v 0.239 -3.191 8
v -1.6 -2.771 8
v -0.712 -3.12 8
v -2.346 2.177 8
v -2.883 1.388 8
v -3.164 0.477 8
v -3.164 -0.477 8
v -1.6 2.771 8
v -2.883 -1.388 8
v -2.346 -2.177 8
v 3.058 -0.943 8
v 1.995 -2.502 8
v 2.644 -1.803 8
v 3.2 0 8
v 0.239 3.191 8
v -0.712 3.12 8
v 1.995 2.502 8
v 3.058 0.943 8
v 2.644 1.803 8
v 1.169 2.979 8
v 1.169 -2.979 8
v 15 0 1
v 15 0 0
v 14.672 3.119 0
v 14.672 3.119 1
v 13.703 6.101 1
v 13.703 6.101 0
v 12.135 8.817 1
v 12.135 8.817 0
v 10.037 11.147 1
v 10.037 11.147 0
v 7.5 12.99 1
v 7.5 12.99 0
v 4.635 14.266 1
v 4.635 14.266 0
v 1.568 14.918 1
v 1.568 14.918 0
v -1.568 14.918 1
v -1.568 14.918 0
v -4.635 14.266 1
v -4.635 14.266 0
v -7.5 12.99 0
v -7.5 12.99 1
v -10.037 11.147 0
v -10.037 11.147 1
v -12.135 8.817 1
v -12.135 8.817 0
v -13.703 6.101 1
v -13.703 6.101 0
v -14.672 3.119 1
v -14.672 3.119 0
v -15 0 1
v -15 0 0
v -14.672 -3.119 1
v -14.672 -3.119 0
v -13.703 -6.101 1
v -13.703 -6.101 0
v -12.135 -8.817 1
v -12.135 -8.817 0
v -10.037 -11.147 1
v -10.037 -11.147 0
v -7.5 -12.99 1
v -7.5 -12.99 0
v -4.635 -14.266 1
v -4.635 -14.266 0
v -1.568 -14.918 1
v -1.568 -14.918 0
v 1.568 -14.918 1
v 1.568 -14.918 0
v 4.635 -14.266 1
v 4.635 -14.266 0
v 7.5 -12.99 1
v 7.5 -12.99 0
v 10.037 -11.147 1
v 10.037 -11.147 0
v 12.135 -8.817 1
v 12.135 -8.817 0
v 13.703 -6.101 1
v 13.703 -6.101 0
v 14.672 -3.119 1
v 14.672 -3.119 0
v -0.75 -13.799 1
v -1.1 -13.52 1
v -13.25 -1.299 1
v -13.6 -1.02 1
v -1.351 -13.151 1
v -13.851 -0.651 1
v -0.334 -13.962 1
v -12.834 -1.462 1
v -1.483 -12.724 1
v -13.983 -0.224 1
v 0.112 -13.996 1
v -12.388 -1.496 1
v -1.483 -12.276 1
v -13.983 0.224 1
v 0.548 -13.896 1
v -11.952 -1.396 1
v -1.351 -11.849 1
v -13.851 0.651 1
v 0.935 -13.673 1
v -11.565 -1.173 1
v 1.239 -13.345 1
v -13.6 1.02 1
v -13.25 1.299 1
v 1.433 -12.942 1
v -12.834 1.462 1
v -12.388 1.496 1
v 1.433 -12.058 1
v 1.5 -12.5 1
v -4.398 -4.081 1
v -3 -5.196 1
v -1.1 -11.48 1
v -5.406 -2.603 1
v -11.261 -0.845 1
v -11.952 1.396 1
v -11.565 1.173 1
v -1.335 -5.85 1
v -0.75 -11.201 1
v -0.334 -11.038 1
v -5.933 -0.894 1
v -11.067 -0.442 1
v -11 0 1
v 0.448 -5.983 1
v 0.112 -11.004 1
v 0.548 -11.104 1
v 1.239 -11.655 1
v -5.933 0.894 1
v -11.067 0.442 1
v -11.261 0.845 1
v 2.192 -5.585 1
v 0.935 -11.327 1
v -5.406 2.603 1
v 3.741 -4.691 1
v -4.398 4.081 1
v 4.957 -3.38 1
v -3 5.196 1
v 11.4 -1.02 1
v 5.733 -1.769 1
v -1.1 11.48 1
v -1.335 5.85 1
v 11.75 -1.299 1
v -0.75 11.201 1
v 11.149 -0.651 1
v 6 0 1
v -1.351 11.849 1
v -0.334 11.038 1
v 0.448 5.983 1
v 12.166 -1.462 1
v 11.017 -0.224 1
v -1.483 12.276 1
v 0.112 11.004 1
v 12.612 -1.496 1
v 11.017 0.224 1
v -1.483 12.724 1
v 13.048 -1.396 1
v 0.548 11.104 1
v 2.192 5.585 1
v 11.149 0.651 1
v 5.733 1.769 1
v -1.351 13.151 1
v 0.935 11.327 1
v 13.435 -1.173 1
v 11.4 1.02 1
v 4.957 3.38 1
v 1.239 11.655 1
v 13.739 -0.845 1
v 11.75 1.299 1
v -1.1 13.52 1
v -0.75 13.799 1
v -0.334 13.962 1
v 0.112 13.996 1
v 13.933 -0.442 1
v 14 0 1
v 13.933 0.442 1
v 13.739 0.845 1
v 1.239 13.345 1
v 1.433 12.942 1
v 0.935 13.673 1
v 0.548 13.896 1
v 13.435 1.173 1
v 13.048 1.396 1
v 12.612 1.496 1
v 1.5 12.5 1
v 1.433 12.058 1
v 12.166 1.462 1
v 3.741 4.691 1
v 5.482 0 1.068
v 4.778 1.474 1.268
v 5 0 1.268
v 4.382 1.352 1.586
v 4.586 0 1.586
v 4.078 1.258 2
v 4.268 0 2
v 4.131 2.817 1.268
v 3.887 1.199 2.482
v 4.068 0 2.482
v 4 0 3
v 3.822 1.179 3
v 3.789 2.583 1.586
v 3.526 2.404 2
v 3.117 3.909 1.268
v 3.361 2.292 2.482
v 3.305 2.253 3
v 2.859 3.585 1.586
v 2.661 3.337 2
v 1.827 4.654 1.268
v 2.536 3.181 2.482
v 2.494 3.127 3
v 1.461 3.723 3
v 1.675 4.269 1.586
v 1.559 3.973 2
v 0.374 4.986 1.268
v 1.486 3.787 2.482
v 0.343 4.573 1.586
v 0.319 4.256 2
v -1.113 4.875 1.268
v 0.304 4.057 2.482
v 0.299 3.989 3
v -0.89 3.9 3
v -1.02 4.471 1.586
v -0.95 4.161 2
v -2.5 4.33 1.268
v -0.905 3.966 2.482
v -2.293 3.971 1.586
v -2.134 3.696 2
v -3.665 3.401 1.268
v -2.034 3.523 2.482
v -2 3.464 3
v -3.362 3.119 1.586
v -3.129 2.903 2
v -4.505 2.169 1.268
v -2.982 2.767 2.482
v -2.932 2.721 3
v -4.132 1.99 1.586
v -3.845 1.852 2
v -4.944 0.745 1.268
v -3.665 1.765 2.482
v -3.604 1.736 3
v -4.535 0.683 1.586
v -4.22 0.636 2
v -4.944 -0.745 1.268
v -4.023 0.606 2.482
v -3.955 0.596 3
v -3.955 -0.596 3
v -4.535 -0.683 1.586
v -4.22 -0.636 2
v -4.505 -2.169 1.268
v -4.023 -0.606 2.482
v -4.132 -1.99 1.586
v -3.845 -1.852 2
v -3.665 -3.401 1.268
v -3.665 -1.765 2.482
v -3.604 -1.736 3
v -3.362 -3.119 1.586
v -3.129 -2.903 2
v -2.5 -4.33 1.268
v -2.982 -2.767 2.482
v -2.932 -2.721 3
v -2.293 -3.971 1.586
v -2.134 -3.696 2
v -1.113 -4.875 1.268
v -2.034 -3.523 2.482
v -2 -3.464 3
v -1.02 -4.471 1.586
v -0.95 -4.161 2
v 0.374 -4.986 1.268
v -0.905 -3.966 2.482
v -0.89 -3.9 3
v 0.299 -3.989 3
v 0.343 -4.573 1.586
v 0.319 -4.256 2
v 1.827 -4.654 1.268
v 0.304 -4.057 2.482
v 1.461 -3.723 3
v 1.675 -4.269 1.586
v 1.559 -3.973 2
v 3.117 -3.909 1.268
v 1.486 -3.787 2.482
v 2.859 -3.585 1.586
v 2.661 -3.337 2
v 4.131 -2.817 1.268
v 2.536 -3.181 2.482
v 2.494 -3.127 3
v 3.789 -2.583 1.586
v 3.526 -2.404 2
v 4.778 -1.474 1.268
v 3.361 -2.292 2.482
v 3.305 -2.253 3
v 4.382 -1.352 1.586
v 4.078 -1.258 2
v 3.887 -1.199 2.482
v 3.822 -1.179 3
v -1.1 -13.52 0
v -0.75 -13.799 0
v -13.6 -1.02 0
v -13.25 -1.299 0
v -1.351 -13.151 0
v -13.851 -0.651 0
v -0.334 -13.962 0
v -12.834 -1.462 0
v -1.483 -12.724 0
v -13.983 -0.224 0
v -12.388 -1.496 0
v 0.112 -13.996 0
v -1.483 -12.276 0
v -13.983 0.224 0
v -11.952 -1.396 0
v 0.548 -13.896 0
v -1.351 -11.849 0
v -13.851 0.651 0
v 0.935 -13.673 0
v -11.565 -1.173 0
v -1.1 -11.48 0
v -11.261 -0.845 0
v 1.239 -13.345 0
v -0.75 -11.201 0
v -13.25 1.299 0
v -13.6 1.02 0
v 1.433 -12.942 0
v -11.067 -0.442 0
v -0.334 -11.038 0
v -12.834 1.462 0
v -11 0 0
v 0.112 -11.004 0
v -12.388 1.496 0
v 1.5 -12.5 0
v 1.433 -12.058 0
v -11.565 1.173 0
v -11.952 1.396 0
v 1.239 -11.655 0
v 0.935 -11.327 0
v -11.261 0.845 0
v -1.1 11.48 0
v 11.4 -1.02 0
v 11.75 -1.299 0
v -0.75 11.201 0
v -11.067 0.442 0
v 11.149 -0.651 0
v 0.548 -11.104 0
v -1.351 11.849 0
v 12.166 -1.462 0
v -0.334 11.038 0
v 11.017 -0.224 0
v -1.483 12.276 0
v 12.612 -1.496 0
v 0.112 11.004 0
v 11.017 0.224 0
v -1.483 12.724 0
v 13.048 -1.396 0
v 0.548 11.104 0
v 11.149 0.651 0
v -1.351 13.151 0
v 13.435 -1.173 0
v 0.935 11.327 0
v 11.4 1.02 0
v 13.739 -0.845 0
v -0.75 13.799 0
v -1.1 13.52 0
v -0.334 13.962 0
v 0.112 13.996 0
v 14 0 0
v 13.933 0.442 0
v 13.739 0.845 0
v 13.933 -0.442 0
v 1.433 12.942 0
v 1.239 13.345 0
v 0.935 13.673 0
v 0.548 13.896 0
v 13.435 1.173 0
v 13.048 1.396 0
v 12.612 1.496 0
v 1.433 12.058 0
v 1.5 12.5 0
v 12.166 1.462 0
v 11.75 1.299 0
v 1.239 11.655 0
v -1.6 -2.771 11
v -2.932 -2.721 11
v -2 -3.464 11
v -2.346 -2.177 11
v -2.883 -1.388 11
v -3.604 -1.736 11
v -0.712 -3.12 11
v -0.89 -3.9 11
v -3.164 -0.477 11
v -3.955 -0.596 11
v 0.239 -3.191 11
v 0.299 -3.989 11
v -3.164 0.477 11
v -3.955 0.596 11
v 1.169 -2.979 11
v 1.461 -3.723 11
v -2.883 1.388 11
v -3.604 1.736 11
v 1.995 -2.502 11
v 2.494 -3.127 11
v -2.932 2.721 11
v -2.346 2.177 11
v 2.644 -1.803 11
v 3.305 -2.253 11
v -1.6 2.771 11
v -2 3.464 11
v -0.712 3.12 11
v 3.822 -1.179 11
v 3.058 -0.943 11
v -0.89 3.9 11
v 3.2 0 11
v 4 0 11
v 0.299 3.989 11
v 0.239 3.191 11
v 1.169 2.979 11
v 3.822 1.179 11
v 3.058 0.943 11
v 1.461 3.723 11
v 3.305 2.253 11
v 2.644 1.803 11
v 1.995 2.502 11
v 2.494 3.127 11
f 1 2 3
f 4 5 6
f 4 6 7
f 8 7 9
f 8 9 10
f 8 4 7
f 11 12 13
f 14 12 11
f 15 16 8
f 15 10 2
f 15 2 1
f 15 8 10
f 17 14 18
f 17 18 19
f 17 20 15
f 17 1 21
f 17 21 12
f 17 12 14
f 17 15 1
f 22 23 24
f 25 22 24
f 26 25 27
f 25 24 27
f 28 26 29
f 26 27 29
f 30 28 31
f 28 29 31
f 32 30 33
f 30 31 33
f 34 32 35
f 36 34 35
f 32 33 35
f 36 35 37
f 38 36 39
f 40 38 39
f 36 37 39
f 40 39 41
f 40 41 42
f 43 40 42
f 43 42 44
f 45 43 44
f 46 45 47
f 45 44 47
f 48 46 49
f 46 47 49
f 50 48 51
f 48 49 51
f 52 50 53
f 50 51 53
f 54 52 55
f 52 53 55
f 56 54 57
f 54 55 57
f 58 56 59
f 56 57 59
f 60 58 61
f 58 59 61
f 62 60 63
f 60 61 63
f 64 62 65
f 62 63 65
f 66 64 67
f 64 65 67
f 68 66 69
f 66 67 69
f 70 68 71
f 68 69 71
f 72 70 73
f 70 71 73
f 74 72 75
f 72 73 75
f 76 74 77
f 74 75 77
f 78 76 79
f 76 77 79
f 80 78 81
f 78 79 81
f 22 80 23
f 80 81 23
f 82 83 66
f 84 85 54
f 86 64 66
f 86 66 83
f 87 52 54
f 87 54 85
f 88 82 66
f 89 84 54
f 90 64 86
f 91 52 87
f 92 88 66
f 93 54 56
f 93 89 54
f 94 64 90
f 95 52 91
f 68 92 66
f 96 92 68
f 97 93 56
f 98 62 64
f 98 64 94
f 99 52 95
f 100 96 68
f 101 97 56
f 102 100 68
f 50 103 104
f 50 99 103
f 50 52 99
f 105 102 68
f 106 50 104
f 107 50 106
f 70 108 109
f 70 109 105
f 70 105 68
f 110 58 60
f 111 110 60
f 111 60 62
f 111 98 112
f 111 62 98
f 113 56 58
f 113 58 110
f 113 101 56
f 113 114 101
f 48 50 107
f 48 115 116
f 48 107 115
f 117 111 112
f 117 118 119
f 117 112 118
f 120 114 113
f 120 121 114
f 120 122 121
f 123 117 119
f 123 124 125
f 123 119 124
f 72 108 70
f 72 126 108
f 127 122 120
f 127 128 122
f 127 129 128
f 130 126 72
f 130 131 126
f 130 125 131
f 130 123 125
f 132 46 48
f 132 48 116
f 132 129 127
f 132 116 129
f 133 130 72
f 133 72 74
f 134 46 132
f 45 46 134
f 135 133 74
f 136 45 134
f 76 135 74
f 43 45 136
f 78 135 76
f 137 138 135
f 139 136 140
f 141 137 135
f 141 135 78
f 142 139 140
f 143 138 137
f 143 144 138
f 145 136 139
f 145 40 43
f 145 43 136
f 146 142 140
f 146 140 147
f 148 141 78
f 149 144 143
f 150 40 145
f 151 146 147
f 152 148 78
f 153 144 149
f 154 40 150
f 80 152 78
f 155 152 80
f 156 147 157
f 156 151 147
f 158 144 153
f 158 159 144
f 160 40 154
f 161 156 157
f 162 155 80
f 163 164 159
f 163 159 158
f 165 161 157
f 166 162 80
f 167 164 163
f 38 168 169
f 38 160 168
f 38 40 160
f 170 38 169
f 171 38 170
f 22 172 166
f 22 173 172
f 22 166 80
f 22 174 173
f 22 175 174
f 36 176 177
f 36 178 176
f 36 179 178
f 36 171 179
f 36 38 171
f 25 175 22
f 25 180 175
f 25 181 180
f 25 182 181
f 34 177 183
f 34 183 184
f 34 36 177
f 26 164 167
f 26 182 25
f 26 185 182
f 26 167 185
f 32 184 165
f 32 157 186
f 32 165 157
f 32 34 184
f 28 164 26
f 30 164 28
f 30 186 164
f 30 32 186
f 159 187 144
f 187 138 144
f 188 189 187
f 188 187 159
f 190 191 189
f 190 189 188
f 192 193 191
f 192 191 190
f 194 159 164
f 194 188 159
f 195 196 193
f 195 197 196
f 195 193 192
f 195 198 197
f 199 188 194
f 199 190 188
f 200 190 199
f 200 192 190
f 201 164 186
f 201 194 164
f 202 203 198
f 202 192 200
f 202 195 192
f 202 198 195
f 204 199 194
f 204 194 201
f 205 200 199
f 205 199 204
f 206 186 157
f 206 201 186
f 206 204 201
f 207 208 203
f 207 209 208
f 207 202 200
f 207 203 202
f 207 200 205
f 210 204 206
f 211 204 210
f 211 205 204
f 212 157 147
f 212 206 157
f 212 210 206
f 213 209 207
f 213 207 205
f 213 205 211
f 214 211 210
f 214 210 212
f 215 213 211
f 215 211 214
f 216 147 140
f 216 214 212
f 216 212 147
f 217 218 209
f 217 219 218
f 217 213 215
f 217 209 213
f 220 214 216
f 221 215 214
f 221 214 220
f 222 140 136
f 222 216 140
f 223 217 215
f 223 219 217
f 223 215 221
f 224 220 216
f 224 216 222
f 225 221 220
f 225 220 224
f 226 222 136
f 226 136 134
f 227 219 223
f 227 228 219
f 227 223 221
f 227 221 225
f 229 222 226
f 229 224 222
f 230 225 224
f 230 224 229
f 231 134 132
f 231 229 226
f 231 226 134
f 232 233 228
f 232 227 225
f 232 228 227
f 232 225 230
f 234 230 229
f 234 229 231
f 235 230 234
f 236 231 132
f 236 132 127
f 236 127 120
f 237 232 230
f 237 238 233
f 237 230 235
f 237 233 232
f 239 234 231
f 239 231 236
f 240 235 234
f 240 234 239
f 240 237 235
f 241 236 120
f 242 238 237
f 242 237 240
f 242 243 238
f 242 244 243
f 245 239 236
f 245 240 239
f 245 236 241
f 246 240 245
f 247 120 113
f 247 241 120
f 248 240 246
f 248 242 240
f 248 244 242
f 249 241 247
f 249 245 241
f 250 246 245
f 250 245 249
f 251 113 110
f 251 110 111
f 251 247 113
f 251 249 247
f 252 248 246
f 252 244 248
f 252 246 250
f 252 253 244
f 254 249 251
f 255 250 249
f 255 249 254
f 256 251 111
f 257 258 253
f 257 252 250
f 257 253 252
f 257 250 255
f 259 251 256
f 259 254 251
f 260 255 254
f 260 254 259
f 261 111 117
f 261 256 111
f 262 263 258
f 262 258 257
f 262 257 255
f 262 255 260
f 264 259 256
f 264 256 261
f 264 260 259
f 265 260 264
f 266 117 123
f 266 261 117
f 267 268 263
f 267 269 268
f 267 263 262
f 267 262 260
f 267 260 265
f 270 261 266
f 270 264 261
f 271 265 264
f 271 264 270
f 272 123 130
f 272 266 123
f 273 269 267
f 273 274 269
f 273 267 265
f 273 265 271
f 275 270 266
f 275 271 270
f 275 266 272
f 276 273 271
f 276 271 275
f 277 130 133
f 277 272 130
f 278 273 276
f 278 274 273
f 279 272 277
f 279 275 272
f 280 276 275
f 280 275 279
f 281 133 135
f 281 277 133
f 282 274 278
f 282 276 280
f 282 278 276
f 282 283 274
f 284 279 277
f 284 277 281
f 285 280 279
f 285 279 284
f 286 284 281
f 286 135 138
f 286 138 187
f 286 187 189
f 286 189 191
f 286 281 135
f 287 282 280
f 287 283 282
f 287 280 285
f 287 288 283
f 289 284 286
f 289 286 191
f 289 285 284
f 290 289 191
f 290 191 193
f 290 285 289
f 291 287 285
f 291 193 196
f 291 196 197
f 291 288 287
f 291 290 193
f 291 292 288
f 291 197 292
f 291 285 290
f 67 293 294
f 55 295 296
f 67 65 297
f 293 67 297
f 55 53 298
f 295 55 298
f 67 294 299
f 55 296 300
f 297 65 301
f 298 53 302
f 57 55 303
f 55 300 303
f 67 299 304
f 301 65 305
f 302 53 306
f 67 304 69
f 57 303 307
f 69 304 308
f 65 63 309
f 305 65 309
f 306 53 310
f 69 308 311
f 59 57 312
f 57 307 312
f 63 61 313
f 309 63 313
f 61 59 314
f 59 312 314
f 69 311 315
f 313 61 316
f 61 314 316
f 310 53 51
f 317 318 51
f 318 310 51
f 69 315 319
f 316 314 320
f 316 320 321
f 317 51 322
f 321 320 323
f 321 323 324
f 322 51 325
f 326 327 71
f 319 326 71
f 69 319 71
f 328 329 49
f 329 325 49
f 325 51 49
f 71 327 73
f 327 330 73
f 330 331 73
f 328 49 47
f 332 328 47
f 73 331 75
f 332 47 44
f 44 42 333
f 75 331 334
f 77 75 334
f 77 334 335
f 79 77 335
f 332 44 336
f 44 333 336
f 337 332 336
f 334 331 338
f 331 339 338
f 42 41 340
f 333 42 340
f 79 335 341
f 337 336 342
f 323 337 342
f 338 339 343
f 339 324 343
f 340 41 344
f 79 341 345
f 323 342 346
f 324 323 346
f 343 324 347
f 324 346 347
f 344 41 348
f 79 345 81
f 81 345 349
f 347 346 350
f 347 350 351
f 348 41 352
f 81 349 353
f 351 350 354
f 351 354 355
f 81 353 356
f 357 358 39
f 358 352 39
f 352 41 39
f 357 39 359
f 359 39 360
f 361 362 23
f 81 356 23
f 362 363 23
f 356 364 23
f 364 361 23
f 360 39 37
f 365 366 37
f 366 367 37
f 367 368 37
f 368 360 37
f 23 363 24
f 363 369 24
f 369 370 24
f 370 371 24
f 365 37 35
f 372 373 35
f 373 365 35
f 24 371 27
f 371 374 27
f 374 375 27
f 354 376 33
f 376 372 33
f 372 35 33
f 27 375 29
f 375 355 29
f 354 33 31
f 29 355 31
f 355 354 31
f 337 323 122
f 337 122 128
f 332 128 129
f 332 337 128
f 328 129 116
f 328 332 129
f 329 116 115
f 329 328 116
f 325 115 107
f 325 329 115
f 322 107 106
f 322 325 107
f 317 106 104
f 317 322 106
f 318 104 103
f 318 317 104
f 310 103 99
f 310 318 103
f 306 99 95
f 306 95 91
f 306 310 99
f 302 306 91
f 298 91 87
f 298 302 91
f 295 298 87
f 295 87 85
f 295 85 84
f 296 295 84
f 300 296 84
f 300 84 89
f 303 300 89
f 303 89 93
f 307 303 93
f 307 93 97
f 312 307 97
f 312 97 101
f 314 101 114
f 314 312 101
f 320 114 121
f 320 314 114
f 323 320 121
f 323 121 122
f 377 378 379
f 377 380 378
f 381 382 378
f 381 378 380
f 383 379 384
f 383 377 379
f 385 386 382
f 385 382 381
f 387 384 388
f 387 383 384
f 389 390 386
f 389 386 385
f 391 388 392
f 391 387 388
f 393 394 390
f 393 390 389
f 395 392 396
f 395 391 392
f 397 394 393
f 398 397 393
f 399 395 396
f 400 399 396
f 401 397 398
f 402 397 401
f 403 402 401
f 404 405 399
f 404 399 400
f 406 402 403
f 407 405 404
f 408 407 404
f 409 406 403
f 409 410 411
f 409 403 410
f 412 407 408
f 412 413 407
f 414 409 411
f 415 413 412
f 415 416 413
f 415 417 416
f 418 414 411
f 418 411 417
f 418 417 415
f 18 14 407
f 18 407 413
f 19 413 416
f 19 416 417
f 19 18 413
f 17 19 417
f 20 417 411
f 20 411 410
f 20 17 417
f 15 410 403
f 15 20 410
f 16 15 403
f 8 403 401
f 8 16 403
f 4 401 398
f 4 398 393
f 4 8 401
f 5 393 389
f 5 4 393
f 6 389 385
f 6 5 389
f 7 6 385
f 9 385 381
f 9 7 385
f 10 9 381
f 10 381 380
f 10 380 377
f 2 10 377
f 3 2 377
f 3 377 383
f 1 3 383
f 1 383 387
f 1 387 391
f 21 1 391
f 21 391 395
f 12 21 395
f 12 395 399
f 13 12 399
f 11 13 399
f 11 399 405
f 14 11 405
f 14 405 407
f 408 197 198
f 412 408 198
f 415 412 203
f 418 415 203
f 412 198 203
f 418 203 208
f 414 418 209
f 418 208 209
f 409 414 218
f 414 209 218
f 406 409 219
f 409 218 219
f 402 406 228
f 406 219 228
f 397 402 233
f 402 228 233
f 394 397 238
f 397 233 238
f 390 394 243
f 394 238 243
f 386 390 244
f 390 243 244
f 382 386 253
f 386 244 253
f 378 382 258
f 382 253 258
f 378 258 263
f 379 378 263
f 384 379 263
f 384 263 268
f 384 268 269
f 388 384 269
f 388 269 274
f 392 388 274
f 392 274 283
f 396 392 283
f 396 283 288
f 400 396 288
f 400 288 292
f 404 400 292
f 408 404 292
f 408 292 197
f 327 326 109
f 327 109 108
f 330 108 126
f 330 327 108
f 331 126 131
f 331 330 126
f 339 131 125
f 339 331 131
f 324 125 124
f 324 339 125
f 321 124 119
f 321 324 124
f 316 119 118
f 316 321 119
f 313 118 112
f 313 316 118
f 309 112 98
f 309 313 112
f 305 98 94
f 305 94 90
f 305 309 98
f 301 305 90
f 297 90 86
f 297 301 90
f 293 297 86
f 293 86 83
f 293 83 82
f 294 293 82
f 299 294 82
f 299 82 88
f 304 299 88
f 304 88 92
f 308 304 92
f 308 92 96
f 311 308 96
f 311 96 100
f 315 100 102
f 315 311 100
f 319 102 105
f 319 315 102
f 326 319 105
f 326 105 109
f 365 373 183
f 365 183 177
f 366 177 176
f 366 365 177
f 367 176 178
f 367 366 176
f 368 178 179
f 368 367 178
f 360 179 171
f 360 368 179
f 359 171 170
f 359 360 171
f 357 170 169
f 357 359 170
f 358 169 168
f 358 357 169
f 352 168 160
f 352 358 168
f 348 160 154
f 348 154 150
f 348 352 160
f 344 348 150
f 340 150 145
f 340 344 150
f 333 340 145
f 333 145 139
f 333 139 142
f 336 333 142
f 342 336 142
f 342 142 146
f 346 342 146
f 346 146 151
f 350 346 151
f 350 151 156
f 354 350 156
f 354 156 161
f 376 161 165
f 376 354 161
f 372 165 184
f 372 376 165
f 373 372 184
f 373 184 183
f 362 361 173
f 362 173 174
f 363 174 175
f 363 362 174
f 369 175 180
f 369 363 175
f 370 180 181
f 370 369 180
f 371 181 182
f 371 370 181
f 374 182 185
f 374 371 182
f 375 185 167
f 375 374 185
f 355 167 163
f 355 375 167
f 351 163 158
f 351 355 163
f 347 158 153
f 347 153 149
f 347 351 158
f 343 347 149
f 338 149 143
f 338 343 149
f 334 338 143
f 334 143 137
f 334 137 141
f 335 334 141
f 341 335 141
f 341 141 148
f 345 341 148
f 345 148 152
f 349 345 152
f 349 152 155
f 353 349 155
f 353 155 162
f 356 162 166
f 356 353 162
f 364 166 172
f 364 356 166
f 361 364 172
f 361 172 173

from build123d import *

# Parameters (mm, degrees)
SKETCH1_R           = 15
SKETCH1_R_2         = 4
SKETCH1_R_3         = 1.5
BOSS_EXTRUDE1_DEPTH = 1
SKETCH1_4_R         = 4
SKETCH1_4_R_2       = 3.2
BOSS_EXTRUDE2_DEPTH = 11
SKETCH1_5_R         = 3.2
BOSS_EXTRUDE3_DEPTH = 8
FILLET1_R           = 2


with BuildPart() as part:
    # Sketch1 → Boss-Extrude1 (new body)
    with BuildSketch(Plane.XY):
        Circle(SKETCH1_R)
        Circle(SKETCH1_R_2, mode=Mode.SUBTRACT)
        with Locations((0, 12.5)):
            Circle(SKETCH1_R_3, mode=Mode.SUBTRACT)
        with Locations((12.5, 0)):
            Circle(SKETCH1_R_3, mode=Mode.SUBTRACT)
        with Locations((0, -12.5)):
            Circle(SKETCH1_R_3, mode=Mode.SUBTRACT)
        with Locations((-12.5, 0)):
            Circle(SKETCH1_R_3, mode=Mode.SUBTRACT)
    extrude(amount=BOSS_EXTRUDE1_DEPTH)

    # Sketch1<4> → Boss-Extrude2 (add)
    with BuildSketch(Plane.XY):
        Circle(SKETCH1_4_R)
        Circle(SKETCH1_4_R_2, mode=Mode.SUBTRACT)
    extrude(amount=BOSS_EXTRUDE2_DEPTH)

    # Sketch1<5> → Boss-Extrude3 (add)
    with BuildSketch(Plane.XY):
        Circle(SKETCH1_5_R)
    extrude(amount=BOSS_EXTRUDE3_DEPTH)

    # Fillet1
    fillet1_edges = [part.edges().sort_by_distance(p)[0] for p in [
        (-4, 0, 1),
    ]]
    fillet(fillet1_edges, radius=FILLET1_R)


solid = part.part
